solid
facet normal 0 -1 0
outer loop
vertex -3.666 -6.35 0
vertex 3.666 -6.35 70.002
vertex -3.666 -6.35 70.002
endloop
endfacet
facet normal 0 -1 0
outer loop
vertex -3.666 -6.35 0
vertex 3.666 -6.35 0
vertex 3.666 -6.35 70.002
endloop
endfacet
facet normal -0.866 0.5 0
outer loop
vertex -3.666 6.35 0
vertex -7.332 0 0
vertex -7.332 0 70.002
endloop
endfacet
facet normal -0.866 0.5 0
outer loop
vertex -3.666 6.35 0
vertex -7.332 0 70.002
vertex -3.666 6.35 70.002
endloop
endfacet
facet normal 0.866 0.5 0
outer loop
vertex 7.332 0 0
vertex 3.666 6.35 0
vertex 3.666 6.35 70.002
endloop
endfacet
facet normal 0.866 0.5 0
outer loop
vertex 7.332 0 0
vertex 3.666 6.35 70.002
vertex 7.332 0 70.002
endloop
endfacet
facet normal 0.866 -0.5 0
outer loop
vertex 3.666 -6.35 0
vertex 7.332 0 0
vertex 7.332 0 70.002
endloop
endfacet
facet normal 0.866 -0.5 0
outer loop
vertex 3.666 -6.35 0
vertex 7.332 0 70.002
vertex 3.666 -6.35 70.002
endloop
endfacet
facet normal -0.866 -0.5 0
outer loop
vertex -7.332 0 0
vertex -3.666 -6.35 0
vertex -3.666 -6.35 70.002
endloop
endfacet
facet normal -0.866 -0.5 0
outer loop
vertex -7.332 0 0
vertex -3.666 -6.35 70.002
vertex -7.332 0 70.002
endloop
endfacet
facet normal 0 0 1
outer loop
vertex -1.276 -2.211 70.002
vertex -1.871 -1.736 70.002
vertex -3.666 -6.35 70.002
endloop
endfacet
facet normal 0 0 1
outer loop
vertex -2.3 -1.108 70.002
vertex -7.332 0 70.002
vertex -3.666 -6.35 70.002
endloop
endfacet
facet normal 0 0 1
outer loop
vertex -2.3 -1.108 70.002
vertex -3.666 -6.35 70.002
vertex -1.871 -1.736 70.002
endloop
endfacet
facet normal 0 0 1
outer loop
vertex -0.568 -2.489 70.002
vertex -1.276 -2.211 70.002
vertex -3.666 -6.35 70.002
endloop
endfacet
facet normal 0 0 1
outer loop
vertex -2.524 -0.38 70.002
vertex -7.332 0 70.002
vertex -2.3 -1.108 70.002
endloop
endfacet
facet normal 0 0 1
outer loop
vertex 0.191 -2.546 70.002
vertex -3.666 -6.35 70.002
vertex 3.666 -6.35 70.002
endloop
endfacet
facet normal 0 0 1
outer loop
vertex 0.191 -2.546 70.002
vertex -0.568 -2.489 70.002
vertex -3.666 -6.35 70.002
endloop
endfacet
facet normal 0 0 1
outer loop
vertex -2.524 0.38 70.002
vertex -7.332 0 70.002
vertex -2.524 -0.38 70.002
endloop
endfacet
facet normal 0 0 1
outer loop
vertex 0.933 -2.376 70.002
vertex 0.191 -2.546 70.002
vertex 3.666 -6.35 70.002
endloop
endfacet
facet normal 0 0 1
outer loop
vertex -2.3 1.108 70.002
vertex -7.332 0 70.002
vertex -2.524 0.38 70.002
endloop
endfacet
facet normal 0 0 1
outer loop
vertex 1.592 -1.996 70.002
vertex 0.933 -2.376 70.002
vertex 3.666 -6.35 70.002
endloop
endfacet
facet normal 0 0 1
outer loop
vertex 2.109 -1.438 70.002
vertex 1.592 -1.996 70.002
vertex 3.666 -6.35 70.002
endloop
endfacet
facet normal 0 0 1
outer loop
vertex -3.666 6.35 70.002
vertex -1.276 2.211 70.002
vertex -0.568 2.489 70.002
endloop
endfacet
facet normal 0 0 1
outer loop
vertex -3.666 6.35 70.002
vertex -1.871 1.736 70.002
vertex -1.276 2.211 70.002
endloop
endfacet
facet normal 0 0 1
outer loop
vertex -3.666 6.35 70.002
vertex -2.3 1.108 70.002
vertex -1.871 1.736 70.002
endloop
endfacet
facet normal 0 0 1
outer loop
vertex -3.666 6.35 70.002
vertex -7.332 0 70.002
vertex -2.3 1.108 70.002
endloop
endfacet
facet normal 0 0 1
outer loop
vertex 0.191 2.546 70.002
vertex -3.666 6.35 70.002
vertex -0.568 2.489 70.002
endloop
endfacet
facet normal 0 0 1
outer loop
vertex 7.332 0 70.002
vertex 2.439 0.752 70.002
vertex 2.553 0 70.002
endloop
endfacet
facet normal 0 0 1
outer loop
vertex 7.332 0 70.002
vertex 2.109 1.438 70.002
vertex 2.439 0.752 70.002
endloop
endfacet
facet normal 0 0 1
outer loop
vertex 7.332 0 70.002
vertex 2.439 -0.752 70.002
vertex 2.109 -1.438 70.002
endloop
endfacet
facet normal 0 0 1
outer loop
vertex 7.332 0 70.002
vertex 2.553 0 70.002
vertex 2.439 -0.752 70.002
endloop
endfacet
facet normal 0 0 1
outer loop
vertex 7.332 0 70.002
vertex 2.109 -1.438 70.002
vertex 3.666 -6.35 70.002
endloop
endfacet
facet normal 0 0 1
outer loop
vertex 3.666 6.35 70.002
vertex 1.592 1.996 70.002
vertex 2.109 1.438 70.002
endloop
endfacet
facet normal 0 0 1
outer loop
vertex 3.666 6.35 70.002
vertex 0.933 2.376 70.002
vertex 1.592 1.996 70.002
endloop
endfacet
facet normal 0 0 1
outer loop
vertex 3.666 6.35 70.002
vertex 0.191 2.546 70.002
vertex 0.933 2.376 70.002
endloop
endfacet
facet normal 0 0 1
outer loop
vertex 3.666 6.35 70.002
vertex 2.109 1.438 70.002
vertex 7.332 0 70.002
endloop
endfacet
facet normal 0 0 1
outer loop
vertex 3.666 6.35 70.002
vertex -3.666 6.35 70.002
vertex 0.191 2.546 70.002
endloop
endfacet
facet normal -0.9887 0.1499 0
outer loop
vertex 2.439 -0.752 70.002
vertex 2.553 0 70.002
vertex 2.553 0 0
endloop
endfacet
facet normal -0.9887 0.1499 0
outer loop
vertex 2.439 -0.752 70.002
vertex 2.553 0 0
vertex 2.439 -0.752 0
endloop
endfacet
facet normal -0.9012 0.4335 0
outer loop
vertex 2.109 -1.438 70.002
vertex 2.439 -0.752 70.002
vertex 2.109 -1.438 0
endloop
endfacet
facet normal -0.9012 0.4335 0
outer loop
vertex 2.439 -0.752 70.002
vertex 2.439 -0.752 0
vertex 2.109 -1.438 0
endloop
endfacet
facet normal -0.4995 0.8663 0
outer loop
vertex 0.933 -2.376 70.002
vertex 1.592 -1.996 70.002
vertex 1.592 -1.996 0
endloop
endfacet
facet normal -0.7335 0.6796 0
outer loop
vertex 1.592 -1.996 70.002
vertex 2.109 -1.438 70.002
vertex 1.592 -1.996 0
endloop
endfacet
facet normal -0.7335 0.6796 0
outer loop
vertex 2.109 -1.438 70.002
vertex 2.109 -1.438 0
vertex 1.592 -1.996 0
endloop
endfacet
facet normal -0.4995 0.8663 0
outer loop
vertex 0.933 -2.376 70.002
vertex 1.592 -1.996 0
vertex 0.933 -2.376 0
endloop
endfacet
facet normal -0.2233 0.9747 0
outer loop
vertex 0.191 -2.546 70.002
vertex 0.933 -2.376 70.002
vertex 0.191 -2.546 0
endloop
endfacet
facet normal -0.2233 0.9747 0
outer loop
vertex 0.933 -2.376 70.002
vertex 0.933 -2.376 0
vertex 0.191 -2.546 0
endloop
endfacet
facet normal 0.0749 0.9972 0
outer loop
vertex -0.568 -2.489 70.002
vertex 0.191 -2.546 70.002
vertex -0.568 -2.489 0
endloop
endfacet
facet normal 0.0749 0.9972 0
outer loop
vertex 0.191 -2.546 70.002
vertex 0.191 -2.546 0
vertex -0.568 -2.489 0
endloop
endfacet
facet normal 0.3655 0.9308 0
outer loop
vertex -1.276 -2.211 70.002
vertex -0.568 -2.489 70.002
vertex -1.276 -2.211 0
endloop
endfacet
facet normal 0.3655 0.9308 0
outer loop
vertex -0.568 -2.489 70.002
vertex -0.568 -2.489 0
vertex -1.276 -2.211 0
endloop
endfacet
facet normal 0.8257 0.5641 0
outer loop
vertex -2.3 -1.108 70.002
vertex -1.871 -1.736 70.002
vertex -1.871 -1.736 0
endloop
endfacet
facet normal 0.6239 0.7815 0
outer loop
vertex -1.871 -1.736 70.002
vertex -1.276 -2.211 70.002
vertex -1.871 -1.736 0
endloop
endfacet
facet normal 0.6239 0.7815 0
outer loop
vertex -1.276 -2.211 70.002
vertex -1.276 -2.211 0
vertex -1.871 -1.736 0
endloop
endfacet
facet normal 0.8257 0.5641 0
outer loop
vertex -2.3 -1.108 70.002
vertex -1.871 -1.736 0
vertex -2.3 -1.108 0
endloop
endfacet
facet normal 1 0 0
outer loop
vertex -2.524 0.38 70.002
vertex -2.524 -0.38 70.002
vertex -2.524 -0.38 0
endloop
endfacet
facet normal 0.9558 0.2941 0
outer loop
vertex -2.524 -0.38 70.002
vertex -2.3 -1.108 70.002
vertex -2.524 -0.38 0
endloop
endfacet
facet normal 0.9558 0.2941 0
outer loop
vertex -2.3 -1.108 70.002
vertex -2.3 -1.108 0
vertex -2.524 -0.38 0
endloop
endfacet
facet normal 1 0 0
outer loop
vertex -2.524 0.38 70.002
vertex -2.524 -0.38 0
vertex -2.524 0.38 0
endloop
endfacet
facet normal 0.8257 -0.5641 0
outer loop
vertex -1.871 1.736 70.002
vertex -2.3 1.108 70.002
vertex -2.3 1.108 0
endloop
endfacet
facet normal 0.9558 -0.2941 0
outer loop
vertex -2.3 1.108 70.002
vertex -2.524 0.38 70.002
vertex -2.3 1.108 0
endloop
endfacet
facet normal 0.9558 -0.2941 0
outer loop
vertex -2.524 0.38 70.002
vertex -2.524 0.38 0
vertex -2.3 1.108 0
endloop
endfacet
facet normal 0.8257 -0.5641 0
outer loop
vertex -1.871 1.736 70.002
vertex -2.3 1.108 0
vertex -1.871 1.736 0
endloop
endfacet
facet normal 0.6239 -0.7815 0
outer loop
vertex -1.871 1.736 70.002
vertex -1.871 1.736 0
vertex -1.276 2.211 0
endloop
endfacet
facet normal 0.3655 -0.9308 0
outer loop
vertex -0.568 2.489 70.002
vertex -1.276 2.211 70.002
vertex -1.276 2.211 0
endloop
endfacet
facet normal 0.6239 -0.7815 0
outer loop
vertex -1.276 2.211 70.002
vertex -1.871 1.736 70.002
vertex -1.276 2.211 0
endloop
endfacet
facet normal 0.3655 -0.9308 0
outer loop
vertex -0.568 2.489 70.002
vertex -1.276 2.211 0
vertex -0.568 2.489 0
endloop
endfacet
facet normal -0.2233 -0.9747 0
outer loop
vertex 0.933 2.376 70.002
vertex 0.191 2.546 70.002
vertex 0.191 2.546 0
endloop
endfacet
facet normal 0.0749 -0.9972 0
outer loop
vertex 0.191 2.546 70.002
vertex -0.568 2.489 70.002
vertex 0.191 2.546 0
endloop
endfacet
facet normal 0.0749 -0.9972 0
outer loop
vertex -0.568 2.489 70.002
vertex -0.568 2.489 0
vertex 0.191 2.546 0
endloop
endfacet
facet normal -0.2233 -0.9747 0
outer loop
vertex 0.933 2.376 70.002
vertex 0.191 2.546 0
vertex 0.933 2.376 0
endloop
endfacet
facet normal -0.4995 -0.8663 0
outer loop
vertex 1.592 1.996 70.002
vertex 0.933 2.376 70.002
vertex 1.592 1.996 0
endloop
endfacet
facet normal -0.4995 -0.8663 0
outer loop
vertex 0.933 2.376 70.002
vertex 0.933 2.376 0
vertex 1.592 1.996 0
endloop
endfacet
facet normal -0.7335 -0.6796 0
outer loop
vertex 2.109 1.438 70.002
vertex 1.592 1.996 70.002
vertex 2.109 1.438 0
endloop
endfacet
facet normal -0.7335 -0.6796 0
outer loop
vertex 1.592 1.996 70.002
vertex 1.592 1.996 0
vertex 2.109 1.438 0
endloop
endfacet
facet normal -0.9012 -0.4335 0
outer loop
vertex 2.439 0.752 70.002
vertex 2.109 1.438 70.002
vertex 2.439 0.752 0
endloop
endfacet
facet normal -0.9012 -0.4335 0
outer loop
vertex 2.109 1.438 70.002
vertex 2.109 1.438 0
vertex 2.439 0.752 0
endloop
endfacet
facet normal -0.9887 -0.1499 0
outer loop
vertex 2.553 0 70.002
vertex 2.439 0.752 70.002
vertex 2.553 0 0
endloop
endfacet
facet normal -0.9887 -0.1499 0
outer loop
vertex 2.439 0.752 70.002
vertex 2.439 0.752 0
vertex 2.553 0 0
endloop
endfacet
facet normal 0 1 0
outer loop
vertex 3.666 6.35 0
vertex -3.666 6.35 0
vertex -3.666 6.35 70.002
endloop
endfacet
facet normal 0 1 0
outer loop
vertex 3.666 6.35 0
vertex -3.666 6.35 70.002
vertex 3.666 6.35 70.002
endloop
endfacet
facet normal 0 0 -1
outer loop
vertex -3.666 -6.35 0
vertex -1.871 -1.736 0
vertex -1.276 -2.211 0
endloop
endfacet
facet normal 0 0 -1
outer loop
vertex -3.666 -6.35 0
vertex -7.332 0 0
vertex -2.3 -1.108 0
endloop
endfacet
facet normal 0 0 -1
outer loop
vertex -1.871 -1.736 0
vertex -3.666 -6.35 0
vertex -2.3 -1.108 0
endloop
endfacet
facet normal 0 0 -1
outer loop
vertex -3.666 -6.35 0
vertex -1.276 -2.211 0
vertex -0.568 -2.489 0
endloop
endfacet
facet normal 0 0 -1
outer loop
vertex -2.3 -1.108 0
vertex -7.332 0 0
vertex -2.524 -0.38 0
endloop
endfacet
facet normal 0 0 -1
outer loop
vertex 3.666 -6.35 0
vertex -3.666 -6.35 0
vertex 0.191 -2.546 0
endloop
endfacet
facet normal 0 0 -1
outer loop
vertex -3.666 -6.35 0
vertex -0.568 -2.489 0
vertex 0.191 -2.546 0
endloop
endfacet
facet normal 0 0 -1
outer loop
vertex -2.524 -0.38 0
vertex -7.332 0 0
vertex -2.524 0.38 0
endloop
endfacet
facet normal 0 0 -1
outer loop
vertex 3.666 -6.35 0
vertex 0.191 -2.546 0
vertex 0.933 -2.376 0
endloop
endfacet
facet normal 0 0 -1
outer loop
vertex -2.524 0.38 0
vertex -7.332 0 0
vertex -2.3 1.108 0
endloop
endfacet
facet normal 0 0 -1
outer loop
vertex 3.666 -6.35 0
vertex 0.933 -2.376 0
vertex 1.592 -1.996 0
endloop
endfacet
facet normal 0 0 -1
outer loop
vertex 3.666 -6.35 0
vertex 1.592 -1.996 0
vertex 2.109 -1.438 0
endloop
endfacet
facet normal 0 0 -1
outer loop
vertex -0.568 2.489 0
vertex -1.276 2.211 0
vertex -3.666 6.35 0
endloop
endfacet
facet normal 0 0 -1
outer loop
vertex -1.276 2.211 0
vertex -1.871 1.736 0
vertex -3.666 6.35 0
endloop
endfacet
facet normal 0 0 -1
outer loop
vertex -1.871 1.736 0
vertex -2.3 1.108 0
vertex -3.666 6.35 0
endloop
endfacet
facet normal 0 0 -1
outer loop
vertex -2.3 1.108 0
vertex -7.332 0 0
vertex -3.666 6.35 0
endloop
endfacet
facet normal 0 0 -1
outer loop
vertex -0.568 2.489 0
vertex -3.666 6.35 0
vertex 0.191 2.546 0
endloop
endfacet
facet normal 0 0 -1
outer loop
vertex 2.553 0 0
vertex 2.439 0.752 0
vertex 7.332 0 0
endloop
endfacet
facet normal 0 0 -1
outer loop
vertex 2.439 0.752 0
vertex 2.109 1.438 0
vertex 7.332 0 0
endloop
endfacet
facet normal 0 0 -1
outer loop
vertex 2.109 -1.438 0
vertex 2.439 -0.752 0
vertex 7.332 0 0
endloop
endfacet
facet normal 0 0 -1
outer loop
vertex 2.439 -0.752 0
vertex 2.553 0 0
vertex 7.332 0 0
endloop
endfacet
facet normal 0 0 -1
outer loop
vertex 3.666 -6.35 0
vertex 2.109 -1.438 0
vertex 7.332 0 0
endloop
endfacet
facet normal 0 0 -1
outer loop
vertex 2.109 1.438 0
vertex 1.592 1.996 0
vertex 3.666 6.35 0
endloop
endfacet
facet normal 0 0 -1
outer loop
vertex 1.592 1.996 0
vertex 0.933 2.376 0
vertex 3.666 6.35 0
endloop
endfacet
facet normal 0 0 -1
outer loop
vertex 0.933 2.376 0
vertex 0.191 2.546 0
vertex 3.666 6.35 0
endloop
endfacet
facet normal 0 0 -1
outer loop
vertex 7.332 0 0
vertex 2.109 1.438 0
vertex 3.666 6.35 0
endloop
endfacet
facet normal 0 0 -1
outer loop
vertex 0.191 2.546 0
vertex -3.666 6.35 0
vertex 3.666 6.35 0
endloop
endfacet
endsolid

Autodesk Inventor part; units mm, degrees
ref_plane "YZ Plane" through (0, 0, 0) normal (1, 0, 0) x (0, 1, 0)
ref_plane "XZ Plane" through (0, 0, 0) normal (0, 1, 0) x (-1, 0, 0)
ref_plane "XY Plane" through (0, 0, 0) normal (0, 0, 1) x (1, 0, 0)
sketch "Sketch1" plane through (0, 0, 0) normal (0, 0, 1) x (1, 0, 0)
  line L0 (-7.3323, 0) -> (-3.6662, 6.35)
  line L1 (-3.6662, 6.35) -> (3.6662, 6.35)
  line L2 (3.6662, 6.35) -> (7.3323, 0)
  line L3 (7.3323, 0) -> (3.6662, -6.35)
  line L4 (3.6662, -6.35) -> (-3.6662, -6.35)
  line L5 (-3.6662, -6.35) -> (-7.3323, 0)
  circle A0 centre (0, 0) radius 2.5527
  dimension "d0" = 12.7
  dimension "d1" = 5.1054
extrude "Extrusion1" add sketch "Sketch1" along normal blind 70.0024
thread "Thread1" size "12-24 UNC" class "2B" standard "ANSI Unified Screw Threads" full length
properties part number "2.756_hexshaft" material "Aluminum 6061"
